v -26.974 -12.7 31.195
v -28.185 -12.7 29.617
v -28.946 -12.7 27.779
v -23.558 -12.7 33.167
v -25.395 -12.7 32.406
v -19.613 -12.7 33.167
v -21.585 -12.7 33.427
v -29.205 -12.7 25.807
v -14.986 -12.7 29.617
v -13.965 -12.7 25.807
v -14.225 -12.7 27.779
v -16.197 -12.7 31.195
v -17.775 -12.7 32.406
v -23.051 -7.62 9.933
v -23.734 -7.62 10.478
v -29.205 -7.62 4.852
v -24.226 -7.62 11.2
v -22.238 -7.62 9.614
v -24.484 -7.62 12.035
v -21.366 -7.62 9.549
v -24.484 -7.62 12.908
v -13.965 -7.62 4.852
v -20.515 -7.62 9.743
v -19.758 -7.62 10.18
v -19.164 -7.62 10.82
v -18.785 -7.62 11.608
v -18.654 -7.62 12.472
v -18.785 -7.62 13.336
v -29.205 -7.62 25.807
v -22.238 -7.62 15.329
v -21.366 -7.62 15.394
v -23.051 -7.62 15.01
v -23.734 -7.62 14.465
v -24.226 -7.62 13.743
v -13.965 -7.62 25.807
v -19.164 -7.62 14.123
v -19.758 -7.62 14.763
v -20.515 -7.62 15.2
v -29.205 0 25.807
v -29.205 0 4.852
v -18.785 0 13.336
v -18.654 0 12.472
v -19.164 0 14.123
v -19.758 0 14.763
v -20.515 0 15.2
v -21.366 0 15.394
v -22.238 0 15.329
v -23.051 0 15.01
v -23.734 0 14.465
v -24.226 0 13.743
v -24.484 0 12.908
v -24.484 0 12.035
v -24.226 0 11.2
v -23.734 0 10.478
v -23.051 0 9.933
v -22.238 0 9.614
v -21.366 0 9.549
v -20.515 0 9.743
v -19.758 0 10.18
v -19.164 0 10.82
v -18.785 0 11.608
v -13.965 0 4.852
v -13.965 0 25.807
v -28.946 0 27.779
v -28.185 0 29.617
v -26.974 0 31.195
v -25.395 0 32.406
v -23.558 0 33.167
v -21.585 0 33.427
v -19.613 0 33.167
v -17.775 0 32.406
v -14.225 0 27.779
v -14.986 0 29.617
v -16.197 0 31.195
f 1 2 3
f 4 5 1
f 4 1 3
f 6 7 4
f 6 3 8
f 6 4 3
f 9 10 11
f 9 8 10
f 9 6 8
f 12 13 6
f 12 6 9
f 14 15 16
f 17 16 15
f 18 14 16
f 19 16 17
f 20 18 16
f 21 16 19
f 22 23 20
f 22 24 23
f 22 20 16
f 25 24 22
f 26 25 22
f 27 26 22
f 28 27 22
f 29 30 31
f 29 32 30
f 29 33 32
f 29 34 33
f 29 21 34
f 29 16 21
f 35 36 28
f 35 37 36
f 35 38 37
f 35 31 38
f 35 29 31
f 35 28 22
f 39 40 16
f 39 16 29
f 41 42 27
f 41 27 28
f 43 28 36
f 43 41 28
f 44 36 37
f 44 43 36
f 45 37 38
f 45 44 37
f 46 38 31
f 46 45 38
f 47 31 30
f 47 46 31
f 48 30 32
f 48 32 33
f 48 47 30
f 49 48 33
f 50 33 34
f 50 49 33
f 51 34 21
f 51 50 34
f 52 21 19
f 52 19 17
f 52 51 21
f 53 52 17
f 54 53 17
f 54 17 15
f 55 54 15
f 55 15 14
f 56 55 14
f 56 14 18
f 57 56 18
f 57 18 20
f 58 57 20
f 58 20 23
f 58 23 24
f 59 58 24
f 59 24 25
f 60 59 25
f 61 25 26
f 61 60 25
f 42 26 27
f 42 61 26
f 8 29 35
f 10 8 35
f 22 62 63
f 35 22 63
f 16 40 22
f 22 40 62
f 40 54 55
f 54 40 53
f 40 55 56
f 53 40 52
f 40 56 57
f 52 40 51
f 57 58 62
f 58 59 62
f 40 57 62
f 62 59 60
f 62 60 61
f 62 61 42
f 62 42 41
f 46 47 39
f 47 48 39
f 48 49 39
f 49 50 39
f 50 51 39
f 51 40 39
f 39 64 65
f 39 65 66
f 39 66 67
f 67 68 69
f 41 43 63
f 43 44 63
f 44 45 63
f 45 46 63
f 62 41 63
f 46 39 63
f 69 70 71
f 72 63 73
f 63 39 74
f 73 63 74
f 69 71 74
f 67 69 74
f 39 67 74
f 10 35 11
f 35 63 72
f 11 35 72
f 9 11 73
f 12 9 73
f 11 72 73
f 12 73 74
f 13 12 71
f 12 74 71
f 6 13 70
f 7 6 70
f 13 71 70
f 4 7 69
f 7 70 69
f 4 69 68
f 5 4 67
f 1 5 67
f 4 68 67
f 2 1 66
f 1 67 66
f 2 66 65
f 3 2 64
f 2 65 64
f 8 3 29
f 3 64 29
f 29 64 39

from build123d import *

# Parameters (mm, degrees)
F0_W     = 15.24
F0_H     = 20.9549992294
F0_R     = 2.9310682444
F1_DEPTH = 7.62
F2_DEPTH = 12.7


with BuildPart() as f1:
    # F0 (on Front) → F1 (new body)
    with BuildSketch(Plane.XZ):
        with BuildLine():
            ThreePointArc((-13.9654323469, 25.8065824842), (-21.5854323469, 33.4265824842), (-29.2054323469, 25.8065824842))
            Line((-29.2054323469, 25.8065824842), (-13.9654323469, 25.8065824842))
        make_face()
        with Locations((-21.5854323469, 15.3290828695)):
            Rectangle(F0_W, F0_H)
        with Locations((-21.5854323469, 12.4715832548)):
            Circle(F0_R, mode=Mode.SUBTRACT)
    extrude(amount=F1_DEPTH)

    # F0 (on Front) → F2 (join)
    with BuildSketch(Plane.XZ):
        with BuildLine():
            ThreePointArc((-13.9654323469, 25.8065824842), (-21.5854323469, 33.4265824842), (-29.2054323469, 25.8065824842))
            Line((-29.2054323469, 25.8065824842), (-13.9654323469, 25.8065824842))
        make_face()
    extrude(amount=F2_DEPTH)


solid = f1.part
